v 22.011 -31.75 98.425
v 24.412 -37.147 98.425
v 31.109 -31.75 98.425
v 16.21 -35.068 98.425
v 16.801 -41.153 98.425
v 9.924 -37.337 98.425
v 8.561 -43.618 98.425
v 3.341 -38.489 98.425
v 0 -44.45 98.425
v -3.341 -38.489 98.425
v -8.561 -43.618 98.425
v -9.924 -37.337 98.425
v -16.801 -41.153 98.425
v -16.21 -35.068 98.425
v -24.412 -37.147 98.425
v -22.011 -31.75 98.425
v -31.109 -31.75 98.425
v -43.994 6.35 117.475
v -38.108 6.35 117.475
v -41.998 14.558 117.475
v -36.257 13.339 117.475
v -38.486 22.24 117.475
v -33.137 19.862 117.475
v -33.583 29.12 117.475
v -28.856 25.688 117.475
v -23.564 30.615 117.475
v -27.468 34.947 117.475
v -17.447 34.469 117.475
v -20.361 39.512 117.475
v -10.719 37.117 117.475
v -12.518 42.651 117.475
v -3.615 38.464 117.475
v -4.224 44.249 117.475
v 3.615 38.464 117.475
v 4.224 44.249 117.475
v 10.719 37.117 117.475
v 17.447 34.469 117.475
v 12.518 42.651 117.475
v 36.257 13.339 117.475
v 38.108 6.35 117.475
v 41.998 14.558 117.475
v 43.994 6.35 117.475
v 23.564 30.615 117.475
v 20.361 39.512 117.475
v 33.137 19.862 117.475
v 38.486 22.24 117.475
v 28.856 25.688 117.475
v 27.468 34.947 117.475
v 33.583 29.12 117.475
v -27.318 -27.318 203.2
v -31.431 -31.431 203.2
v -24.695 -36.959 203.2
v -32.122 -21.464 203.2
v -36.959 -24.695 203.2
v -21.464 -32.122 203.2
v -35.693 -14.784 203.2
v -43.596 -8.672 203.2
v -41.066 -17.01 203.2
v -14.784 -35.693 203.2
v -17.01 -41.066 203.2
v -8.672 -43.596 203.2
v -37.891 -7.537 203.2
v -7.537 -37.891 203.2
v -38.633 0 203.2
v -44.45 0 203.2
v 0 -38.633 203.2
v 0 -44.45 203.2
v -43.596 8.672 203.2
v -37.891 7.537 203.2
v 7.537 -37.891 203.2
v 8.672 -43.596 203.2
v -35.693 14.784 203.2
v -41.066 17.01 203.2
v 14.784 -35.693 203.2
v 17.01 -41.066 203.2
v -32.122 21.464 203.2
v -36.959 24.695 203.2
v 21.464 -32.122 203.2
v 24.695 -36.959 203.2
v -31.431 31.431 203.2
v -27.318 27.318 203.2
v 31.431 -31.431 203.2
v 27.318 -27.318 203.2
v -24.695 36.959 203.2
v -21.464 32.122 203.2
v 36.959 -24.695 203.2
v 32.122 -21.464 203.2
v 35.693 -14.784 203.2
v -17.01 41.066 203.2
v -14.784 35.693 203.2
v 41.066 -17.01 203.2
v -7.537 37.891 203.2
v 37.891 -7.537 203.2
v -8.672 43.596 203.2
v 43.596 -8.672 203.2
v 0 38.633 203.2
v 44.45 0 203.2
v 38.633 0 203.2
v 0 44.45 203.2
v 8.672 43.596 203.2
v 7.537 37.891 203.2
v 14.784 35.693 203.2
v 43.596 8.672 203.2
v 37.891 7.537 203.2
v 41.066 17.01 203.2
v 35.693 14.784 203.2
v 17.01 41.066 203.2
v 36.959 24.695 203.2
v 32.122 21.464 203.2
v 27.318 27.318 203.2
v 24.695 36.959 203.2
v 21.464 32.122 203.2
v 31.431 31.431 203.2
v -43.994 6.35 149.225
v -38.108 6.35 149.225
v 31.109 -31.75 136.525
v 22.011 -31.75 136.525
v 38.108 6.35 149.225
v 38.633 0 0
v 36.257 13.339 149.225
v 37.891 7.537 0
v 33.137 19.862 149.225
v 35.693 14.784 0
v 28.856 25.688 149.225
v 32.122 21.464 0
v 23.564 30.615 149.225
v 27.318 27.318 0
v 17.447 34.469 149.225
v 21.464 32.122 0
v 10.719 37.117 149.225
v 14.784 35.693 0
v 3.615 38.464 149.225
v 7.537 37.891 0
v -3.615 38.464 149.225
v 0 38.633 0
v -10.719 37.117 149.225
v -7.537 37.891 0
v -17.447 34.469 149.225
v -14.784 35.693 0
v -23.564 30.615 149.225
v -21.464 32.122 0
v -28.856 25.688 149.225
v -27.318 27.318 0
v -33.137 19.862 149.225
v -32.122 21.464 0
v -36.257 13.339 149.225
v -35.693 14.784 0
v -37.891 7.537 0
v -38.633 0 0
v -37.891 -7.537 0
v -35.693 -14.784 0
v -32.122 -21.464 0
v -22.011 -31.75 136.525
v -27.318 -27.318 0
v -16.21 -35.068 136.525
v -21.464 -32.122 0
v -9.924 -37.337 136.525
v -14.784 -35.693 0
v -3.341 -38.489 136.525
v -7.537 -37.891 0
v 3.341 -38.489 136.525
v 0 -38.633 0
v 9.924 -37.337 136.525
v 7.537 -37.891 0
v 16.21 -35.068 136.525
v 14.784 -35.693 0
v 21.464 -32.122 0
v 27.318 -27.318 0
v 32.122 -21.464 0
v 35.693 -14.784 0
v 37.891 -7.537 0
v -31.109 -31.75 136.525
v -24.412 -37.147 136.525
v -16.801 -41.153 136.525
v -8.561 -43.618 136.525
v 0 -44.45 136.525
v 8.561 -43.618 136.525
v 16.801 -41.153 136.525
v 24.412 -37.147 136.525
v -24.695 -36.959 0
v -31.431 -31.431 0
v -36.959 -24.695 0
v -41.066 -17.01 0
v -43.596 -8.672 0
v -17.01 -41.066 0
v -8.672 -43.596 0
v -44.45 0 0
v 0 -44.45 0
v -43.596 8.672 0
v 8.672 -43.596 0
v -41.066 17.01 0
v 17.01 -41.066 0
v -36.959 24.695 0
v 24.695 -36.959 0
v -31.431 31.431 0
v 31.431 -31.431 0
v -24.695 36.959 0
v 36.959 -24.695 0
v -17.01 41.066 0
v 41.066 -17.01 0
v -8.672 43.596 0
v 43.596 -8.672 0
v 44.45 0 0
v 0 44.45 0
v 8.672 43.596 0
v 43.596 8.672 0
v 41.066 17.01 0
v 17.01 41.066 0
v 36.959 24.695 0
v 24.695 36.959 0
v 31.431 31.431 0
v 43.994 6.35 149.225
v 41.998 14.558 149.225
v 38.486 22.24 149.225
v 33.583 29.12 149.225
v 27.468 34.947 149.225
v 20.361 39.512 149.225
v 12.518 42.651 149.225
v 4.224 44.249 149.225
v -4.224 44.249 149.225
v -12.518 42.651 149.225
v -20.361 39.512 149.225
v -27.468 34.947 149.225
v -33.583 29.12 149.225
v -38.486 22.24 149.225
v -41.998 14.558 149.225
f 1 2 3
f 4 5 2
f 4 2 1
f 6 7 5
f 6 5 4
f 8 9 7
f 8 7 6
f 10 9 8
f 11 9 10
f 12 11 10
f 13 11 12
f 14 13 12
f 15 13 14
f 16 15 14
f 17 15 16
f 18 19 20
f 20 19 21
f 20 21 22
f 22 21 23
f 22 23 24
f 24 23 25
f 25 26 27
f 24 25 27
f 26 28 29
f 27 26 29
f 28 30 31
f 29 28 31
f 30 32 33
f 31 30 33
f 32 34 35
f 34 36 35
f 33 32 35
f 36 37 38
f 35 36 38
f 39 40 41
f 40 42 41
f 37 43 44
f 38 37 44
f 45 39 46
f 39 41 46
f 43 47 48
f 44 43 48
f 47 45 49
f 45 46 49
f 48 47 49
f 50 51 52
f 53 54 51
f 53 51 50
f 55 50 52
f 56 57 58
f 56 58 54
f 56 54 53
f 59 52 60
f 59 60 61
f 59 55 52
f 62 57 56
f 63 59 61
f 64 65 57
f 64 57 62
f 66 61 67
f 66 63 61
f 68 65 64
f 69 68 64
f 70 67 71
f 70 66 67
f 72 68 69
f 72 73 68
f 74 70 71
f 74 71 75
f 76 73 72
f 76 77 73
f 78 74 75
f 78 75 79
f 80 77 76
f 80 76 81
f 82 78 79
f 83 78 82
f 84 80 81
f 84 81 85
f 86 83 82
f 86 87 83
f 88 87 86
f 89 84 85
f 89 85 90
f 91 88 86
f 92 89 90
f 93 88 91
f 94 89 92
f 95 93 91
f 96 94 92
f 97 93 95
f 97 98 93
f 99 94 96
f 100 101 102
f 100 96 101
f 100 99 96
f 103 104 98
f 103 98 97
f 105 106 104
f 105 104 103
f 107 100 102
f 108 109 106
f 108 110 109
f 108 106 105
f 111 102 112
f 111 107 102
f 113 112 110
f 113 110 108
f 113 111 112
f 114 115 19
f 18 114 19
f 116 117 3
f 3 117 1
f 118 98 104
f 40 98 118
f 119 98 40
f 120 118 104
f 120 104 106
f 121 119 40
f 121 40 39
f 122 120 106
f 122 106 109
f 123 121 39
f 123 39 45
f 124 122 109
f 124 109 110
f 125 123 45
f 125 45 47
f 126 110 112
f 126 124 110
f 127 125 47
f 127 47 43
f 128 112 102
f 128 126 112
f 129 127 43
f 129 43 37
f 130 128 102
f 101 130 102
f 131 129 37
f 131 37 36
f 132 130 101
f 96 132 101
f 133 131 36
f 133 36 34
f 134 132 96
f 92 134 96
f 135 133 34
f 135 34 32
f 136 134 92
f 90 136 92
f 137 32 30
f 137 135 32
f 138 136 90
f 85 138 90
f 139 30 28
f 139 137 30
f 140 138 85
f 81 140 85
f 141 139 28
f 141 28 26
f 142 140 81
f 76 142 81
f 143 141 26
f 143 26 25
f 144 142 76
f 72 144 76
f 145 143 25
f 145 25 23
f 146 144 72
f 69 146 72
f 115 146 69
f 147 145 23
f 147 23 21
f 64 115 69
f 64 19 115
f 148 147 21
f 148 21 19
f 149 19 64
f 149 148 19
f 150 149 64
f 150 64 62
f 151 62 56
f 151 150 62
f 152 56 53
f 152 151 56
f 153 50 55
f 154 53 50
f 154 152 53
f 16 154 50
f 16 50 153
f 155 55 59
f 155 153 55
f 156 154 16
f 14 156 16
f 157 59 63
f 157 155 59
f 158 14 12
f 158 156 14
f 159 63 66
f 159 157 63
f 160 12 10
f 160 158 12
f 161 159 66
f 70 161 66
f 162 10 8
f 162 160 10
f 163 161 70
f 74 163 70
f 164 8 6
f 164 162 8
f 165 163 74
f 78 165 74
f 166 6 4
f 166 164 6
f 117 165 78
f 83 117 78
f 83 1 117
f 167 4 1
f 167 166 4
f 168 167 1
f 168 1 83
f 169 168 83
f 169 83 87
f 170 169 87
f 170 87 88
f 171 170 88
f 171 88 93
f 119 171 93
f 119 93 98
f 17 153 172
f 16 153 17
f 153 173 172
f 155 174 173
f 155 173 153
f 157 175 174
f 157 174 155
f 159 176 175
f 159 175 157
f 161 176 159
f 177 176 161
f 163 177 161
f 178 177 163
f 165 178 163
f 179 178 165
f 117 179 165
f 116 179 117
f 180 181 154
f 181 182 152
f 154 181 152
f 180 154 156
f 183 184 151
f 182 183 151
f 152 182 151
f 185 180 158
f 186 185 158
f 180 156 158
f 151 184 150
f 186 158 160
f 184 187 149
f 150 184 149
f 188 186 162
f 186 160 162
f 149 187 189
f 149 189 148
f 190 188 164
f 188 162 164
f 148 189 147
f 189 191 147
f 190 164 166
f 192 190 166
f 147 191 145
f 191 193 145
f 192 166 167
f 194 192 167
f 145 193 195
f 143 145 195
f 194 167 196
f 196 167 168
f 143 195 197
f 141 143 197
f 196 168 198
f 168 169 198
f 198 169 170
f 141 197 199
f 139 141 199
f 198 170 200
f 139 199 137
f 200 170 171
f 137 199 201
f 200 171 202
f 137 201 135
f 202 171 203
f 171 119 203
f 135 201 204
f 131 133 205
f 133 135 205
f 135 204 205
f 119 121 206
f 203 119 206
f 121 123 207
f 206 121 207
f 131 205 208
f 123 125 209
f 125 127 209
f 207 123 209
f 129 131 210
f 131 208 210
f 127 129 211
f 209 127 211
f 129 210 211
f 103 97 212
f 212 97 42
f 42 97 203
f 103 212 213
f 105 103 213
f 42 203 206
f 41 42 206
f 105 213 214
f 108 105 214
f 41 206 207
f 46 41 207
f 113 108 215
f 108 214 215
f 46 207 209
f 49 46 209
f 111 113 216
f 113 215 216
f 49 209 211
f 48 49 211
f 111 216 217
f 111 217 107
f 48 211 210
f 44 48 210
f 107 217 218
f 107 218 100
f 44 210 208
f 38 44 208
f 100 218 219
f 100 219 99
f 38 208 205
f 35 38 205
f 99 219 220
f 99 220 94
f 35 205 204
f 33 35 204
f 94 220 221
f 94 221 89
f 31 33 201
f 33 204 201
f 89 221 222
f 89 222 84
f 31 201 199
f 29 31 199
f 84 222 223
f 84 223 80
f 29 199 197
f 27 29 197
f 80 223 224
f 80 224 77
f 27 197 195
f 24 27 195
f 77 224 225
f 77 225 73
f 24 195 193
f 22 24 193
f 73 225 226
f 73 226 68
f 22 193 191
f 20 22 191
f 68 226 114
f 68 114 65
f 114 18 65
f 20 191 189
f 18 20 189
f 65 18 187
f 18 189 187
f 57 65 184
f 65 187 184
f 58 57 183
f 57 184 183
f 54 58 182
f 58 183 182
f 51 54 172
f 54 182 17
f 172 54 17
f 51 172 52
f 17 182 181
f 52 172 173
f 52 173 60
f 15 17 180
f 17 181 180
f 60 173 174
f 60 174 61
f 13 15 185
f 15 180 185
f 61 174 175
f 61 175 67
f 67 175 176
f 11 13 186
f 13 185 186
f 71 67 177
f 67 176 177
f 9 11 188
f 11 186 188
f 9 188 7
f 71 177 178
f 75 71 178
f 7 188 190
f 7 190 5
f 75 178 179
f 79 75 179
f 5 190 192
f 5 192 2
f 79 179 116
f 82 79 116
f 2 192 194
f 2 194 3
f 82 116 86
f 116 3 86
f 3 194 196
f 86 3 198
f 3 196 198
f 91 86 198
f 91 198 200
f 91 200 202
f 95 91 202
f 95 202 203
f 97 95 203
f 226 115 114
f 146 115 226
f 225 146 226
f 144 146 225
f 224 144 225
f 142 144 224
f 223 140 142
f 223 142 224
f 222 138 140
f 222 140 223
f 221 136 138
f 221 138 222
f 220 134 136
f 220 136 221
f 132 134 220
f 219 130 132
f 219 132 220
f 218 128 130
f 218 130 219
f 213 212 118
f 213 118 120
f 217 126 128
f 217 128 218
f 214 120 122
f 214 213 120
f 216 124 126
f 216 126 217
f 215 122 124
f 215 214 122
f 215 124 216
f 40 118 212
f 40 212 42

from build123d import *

# Parameters (mm, degrees)
SKETCH1_R              = 44.45
SKETCH1_R_2            = 38.6334
BASE_DEPTH             = 203.2
SKETCH2_W              = 31.75
SKETCH2_H              = 38.1
SANDING_CUT_DEPTH      = 45.45
SANDING_CUT_DEPTH_BACK = 45.45
SKETCH3_W              = 38.1
SKETCH3_H              = 12.7
SERVO_CUT_DEPTH        = 45.45
SERVO_CUT_DEPTH_BACK   = 45.45


with BuildPart() as part:
    # Sketch1 → base (new body)
    with BuildSketch(Plane.XY):
        Circle(SKETCH1_R)
        Circle(SKETCH1_R_2, mode=Mode.SUBTRACT)
    extrude(amount=BASE_DEPTH)

    # Sketch2 → sanding cut (cut, two sides)
    with BuildSketch(Plane(origin=(0, 0, 0), x_dir=(0, 0, -1), z_dir=(1, 0, 0))) as sanding_cut_sk:
        with Locations((-133.35, 25.4)):
            Rectangle(SKETCH2_W, SKETCH2_H)
    extrude(amount=SANDING_CUT_DEPTH, mode=Mode.SUBTRACT)
    extrude(sanding_cut_sk.sketch, amount=-SANDING_CUT_DEPTH_BACK, mode=Mode.SUBTRACT)

    # Sketch3 → servo cut (cut, two sides)
    with BuildSketch(Plane(origin=(0, 0, 0), x_dir=(0, 0, -1), z_dir=(1, 0, 0))) as servo_cut_sk:
        with Locations((-117.475, -38.1)):
            Rectangle(SKETCH3_W, SKETCH3_H)
    extrude(amount=SERVO_CUT_DEPTH, mode=Mode.SUBTRACT)
    extrude(servo_cut_sk.sketch, amount=-SERVO_CUT_DEPTH_BACK, mode=Mode.SUBTRACT)


solid = part.part
